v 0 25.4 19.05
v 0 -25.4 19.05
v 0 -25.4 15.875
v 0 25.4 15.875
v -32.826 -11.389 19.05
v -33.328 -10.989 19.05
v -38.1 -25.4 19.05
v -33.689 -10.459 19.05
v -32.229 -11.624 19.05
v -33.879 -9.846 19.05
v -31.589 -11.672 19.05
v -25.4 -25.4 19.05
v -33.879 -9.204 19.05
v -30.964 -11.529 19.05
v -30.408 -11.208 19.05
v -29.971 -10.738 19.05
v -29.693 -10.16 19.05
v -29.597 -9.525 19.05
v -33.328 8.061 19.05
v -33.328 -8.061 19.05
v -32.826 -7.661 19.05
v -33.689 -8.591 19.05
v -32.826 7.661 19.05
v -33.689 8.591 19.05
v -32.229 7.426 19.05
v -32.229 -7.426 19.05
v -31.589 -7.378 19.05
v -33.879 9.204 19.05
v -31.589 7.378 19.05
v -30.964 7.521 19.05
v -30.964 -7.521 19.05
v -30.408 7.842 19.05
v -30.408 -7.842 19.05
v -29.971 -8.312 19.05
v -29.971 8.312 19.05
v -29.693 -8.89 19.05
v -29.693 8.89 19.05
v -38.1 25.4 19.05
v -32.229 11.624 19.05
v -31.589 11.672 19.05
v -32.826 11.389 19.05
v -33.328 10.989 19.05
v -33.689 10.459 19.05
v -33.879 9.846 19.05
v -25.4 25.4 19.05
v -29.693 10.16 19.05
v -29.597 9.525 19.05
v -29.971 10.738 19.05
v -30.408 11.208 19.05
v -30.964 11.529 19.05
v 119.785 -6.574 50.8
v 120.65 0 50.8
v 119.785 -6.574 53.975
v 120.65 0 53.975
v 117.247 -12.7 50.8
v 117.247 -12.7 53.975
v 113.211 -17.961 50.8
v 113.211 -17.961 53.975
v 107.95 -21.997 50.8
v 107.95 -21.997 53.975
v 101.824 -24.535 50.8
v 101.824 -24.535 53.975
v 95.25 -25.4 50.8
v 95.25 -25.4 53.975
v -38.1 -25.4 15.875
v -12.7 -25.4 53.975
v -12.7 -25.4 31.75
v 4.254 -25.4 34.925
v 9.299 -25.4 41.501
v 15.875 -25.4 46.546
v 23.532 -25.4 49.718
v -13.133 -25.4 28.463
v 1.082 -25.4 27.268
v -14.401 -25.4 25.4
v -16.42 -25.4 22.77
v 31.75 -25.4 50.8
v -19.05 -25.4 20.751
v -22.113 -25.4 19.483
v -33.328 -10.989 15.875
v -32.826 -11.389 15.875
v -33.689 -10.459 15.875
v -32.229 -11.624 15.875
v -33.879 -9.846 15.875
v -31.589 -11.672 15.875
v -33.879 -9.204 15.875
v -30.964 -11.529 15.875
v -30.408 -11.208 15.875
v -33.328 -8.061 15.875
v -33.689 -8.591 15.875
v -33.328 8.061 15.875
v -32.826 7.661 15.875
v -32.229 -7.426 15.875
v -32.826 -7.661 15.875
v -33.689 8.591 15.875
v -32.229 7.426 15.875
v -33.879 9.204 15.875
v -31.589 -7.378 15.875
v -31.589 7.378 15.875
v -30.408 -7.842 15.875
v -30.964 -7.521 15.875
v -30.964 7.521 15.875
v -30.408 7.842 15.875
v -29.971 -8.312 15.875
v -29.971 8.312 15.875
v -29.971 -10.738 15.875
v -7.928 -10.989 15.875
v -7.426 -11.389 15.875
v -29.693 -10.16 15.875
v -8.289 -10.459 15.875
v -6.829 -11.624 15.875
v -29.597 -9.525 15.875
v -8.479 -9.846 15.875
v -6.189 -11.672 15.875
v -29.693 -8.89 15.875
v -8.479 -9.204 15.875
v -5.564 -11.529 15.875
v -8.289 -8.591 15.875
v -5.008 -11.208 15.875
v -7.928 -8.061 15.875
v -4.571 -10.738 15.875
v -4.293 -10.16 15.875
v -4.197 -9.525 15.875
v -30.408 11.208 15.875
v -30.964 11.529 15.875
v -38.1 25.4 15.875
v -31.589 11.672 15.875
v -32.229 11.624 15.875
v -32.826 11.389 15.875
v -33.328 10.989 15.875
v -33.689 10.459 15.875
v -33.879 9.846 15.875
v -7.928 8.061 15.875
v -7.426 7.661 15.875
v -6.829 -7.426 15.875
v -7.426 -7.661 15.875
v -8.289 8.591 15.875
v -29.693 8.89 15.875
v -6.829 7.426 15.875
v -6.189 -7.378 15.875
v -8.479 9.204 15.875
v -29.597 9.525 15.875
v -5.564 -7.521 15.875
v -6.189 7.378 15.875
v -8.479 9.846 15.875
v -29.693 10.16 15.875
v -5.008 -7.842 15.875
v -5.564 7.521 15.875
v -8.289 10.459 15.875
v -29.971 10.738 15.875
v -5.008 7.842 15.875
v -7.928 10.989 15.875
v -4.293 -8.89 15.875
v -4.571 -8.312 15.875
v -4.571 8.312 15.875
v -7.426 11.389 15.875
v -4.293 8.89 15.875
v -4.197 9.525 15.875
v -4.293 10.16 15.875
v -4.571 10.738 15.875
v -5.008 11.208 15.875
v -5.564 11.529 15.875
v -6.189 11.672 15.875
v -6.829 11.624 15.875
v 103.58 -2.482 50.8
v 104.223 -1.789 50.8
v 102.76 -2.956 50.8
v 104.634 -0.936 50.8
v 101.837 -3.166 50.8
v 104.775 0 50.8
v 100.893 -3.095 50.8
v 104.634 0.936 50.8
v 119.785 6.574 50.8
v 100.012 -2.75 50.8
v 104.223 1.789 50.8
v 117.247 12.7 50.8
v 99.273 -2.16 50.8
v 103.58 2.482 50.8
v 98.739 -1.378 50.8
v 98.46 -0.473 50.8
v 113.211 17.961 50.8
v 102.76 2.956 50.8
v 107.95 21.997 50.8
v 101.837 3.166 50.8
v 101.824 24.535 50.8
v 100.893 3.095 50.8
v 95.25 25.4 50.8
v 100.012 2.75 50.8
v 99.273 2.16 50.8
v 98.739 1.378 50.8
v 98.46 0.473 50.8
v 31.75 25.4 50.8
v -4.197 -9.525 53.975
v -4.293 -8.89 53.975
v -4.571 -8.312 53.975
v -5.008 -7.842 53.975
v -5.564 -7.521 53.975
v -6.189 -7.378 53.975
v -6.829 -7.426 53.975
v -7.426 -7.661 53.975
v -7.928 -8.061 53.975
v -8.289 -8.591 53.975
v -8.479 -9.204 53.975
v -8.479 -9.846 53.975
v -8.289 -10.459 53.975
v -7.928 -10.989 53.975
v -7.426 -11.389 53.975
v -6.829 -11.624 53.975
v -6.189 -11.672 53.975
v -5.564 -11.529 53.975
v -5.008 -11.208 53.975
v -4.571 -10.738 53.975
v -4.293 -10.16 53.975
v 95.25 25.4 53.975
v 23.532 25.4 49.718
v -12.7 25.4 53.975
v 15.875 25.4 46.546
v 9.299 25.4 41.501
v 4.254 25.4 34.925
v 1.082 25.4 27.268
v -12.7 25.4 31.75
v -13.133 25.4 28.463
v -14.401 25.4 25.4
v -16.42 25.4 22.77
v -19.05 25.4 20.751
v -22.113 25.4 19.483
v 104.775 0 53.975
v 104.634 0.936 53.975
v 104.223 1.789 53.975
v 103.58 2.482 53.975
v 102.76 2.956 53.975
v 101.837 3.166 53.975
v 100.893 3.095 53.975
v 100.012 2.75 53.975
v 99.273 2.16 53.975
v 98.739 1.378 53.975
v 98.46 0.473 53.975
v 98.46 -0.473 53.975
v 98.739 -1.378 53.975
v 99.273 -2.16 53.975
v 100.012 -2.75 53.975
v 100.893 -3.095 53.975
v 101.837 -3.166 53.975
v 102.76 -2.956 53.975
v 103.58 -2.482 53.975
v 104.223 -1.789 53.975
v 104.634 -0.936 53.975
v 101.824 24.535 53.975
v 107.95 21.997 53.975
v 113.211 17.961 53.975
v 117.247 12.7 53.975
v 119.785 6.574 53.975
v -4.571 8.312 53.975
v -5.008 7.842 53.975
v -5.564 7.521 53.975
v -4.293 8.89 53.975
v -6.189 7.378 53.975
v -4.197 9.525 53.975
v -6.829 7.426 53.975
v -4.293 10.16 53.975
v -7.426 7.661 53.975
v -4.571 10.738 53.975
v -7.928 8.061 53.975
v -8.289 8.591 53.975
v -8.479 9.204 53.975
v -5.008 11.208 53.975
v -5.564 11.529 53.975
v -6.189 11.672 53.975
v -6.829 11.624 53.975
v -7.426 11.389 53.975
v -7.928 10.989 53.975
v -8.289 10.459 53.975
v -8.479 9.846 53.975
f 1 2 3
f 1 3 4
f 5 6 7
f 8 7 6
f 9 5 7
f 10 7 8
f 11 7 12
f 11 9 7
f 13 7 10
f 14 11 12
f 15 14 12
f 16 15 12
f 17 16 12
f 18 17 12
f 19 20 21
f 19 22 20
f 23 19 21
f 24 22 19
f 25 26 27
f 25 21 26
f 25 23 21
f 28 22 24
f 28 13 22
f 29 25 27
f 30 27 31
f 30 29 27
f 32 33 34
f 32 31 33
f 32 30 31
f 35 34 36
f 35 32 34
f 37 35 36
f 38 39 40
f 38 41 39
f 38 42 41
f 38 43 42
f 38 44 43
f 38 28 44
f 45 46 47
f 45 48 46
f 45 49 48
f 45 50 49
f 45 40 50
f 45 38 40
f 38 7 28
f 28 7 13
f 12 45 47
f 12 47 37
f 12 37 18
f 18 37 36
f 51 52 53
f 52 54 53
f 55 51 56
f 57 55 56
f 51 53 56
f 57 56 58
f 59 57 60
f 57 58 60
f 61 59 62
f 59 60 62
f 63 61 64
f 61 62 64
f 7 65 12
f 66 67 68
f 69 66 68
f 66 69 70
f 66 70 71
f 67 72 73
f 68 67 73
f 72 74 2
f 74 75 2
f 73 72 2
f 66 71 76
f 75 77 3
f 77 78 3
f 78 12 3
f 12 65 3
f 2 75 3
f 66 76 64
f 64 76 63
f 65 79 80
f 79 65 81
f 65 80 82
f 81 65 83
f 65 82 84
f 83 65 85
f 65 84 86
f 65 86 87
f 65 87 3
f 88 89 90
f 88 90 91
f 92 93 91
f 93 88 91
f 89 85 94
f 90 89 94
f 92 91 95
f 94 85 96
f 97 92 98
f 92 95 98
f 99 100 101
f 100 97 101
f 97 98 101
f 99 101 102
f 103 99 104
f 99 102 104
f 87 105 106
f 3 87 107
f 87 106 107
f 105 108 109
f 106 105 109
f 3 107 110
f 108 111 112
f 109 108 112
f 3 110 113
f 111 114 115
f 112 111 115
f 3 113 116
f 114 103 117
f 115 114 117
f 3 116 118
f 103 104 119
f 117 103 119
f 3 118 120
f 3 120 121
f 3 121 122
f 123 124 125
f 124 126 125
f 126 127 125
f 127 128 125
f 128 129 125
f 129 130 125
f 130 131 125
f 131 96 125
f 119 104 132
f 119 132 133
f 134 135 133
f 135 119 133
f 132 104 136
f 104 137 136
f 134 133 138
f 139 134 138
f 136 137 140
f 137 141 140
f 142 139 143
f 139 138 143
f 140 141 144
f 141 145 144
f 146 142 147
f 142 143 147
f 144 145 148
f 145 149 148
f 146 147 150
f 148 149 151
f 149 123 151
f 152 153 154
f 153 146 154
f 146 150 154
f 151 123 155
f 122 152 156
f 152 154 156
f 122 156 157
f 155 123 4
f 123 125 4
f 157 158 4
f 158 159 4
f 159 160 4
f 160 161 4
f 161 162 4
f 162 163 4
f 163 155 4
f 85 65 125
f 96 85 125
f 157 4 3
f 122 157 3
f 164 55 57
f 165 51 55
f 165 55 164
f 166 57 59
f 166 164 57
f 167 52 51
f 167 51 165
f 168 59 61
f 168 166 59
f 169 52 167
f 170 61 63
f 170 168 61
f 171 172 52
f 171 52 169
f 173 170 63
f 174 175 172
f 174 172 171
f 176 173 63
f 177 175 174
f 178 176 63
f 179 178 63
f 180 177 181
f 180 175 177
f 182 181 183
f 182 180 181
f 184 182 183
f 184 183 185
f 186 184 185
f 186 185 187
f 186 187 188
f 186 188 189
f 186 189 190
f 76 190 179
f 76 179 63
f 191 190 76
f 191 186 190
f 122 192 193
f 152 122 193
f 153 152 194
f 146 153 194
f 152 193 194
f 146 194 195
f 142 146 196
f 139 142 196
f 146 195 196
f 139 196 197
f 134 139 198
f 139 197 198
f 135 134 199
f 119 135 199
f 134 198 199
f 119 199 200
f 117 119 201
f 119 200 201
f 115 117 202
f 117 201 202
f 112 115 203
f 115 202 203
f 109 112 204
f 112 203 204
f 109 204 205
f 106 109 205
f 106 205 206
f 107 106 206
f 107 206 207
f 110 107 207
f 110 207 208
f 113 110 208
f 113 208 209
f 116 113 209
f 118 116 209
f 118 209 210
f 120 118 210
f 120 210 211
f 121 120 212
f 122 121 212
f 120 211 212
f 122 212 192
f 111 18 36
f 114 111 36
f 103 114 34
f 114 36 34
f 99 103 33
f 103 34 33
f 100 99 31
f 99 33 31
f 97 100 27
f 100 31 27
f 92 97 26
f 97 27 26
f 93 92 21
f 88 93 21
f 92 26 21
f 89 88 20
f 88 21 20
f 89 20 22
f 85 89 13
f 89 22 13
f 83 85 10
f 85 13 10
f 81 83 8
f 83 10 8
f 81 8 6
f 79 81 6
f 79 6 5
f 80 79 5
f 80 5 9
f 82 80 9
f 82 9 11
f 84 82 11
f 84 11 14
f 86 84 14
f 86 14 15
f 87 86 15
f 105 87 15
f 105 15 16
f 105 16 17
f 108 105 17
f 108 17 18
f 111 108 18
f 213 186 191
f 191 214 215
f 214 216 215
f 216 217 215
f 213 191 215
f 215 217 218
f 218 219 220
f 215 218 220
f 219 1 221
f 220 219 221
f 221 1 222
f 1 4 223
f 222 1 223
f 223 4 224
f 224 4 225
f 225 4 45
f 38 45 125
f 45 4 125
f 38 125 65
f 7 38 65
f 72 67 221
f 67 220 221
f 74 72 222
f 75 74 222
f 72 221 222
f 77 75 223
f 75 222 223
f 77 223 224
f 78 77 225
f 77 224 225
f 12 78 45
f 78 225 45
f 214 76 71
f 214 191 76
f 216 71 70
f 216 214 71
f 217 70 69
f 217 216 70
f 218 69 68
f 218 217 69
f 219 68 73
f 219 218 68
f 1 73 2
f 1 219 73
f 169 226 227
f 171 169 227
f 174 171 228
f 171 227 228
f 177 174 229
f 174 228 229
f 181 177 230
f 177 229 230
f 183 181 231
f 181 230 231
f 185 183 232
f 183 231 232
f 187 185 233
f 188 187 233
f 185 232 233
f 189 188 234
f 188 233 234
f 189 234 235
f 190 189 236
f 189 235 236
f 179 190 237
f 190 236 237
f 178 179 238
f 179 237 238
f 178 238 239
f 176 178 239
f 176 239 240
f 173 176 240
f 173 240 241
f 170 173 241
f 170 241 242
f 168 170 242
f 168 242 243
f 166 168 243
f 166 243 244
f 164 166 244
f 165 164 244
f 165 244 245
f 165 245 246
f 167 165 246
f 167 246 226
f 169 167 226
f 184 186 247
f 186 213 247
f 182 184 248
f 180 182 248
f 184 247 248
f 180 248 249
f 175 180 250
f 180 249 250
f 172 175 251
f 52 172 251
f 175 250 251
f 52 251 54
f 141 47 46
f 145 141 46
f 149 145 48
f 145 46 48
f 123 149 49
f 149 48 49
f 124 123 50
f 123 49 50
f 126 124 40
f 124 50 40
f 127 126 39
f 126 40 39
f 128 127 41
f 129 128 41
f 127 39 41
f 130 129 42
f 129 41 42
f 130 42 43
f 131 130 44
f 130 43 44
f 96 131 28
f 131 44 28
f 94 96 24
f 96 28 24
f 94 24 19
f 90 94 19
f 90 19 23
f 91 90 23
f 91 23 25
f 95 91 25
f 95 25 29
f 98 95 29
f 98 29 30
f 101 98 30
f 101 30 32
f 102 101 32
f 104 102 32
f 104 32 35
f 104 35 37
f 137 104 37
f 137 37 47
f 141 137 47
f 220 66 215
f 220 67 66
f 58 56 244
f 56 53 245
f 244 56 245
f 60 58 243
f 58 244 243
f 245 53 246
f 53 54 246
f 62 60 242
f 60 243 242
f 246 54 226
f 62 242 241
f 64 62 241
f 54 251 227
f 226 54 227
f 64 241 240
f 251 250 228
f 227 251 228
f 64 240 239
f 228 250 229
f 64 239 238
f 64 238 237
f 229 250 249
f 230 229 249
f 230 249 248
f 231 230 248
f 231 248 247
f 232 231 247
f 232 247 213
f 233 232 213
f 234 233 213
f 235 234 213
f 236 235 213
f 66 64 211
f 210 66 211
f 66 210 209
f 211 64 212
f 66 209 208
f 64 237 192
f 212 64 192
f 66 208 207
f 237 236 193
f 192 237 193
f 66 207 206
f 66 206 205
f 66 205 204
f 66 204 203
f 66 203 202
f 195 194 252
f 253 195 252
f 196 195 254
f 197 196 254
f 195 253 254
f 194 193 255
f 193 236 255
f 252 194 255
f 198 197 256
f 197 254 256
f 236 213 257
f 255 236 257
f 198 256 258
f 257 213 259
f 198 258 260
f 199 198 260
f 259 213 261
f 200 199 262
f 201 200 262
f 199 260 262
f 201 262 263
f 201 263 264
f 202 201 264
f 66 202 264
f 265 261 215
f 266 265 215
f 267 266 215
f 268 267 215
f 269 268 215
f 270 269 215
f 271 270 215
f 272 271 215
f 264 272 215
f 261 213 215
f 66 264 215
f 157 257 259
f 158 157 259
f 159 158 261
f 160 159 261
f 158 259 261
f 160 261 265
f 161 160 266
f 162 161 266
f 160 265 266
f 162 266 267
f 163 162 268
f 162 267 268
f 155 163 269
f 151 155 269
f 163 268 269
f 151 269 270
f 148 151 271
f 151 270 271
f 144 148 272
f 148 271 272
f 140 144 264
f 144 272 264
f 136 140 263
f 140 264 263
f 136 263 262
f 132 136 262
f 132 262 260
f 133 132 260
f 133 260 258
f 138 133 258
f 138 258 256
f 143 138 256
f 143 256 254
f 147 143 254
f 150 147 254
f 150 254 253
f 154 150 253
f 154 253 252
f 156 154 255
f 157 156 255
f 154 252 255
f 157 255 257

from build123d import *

# Parameters (mm, degrees)
BOSS_EXTRUDE1_DEPTH = 3.175
SKETCH2_W           = 12.7
SKETCH2_H           = 50.8
BOSS_EXTRUDE2_DEPTH = 31.75
FILLET1_R           = 12.7
BOSS_EXTRUDE3_DEPTH = 3.175
FILLET2_R           = 31.75
SKETCH4_R           = 2.15265
CUT_EXTRUDE1_DEPTH  = 38.1
FILLET3_R           = 25.4
CUT_EXTRUDE4_REACH  = 131.047
SKETCH7_R           = 3.175


with BuildPart() as part:
    # Sketch1 → Boss-Extrude1 (new body)
    with BuildSketch(Plane.XY.offset(15.875)):
        Polygon((-38.1, 25.4), (-38.1, -25.4), (-25.4, -25.4), (0, -25.4), (0, 25.4), align=None)
    extrude(amount=BOSS_EXTRUDE1_DEPTH)

    # Sketch2 → Boss-Extrude2 (add)
    with BuildSketch(Plane.XY.offset(50.8)):
        with Locations((-6.35, 0)):
            Rectangle(SKETCH2_W, SKETCH2_H)
    extrude(amount=-BOSS_EXTRUDE2_DEPTH)

    # Fillet1
    fillet1_edges = [part.edges().sort_by_distance(p)[0] for p in [
        (-12.7, 0, 19.05),
    ]]
    fillet(fillet1_edges, radius=FILLET1_R)

    # Sketch3 → Boss-Extrude3 (add)
    with BuildSketch(Plane.XY.offset(50.8)):
        Polygon((0, 25.4), (101.6, 25.4), (120.65, 25.4), (120.65, -25.4), (0, -25.4), (-12.7, -25.4), (-12.7, 25.4), align=None)
    extrude(amount=BOSS_EXTRUDE3_DEPTH)

    # Fillet2
    fillet2_edges = [part.edges().sort_by_distance(p)[0] for p in [
        (0, 0, 50.8),
    ]]
    fillet(fillet2_edges, radius=FILLET2_R)

    # Sketch4 → Cut-Extrude1 (cut)
    with BuildSketch(Plane.XY.offset(53.975)):
        with Locations((-6.35, 9.525)):
            Circle(SKETCH4_R)
        with Locations((-31.75, 9.525)):
            Circle(SKETCH4_R)
        with Locations((-6.35, -9.525)):
            Circle(SKETCH4_R)
        with Locations((-31.75, -9.525)):
            Circle(SKETCH4_R)
    extrude(amount=-CUT_EXTRUDE1_DEPTH, mode=Mode.SUBTRACT)

    # Fillet3
    fillet3_edges = [part.edges().sort_by_distance(p)[0] for p in [
        (120.65, -25.4, 52.3875),
        (120.65, 25.4, 52.3875),
    ]]
    fillet(fillet3_edges, radius=FILLET3_R - 0.0001)  # a hair under: the kernel refuses the full size

    # Sketch7 → Cut-Extrude4 (cut, up to next)
    with BuildSketch(Plane.XY.offset(53.975), mode=Mode.PRIVATE) as cut_extrude4_sk1:
        with Locations((101.6, 0)):
            Circle(SKETCH7_R)
    cut_extrude4_tool1 = extrude(cut_extrude4_sk1.sketch, amount=-CUT_EXTRUDE4_REACH, mode=Mode.PRIVATE) & part.part
    add(cut_extrude4_tool1.solids().sort_by_distance((101.6, 0, 53.975))[0], mode=Mode.SUBTRACT)


solid = part.part
